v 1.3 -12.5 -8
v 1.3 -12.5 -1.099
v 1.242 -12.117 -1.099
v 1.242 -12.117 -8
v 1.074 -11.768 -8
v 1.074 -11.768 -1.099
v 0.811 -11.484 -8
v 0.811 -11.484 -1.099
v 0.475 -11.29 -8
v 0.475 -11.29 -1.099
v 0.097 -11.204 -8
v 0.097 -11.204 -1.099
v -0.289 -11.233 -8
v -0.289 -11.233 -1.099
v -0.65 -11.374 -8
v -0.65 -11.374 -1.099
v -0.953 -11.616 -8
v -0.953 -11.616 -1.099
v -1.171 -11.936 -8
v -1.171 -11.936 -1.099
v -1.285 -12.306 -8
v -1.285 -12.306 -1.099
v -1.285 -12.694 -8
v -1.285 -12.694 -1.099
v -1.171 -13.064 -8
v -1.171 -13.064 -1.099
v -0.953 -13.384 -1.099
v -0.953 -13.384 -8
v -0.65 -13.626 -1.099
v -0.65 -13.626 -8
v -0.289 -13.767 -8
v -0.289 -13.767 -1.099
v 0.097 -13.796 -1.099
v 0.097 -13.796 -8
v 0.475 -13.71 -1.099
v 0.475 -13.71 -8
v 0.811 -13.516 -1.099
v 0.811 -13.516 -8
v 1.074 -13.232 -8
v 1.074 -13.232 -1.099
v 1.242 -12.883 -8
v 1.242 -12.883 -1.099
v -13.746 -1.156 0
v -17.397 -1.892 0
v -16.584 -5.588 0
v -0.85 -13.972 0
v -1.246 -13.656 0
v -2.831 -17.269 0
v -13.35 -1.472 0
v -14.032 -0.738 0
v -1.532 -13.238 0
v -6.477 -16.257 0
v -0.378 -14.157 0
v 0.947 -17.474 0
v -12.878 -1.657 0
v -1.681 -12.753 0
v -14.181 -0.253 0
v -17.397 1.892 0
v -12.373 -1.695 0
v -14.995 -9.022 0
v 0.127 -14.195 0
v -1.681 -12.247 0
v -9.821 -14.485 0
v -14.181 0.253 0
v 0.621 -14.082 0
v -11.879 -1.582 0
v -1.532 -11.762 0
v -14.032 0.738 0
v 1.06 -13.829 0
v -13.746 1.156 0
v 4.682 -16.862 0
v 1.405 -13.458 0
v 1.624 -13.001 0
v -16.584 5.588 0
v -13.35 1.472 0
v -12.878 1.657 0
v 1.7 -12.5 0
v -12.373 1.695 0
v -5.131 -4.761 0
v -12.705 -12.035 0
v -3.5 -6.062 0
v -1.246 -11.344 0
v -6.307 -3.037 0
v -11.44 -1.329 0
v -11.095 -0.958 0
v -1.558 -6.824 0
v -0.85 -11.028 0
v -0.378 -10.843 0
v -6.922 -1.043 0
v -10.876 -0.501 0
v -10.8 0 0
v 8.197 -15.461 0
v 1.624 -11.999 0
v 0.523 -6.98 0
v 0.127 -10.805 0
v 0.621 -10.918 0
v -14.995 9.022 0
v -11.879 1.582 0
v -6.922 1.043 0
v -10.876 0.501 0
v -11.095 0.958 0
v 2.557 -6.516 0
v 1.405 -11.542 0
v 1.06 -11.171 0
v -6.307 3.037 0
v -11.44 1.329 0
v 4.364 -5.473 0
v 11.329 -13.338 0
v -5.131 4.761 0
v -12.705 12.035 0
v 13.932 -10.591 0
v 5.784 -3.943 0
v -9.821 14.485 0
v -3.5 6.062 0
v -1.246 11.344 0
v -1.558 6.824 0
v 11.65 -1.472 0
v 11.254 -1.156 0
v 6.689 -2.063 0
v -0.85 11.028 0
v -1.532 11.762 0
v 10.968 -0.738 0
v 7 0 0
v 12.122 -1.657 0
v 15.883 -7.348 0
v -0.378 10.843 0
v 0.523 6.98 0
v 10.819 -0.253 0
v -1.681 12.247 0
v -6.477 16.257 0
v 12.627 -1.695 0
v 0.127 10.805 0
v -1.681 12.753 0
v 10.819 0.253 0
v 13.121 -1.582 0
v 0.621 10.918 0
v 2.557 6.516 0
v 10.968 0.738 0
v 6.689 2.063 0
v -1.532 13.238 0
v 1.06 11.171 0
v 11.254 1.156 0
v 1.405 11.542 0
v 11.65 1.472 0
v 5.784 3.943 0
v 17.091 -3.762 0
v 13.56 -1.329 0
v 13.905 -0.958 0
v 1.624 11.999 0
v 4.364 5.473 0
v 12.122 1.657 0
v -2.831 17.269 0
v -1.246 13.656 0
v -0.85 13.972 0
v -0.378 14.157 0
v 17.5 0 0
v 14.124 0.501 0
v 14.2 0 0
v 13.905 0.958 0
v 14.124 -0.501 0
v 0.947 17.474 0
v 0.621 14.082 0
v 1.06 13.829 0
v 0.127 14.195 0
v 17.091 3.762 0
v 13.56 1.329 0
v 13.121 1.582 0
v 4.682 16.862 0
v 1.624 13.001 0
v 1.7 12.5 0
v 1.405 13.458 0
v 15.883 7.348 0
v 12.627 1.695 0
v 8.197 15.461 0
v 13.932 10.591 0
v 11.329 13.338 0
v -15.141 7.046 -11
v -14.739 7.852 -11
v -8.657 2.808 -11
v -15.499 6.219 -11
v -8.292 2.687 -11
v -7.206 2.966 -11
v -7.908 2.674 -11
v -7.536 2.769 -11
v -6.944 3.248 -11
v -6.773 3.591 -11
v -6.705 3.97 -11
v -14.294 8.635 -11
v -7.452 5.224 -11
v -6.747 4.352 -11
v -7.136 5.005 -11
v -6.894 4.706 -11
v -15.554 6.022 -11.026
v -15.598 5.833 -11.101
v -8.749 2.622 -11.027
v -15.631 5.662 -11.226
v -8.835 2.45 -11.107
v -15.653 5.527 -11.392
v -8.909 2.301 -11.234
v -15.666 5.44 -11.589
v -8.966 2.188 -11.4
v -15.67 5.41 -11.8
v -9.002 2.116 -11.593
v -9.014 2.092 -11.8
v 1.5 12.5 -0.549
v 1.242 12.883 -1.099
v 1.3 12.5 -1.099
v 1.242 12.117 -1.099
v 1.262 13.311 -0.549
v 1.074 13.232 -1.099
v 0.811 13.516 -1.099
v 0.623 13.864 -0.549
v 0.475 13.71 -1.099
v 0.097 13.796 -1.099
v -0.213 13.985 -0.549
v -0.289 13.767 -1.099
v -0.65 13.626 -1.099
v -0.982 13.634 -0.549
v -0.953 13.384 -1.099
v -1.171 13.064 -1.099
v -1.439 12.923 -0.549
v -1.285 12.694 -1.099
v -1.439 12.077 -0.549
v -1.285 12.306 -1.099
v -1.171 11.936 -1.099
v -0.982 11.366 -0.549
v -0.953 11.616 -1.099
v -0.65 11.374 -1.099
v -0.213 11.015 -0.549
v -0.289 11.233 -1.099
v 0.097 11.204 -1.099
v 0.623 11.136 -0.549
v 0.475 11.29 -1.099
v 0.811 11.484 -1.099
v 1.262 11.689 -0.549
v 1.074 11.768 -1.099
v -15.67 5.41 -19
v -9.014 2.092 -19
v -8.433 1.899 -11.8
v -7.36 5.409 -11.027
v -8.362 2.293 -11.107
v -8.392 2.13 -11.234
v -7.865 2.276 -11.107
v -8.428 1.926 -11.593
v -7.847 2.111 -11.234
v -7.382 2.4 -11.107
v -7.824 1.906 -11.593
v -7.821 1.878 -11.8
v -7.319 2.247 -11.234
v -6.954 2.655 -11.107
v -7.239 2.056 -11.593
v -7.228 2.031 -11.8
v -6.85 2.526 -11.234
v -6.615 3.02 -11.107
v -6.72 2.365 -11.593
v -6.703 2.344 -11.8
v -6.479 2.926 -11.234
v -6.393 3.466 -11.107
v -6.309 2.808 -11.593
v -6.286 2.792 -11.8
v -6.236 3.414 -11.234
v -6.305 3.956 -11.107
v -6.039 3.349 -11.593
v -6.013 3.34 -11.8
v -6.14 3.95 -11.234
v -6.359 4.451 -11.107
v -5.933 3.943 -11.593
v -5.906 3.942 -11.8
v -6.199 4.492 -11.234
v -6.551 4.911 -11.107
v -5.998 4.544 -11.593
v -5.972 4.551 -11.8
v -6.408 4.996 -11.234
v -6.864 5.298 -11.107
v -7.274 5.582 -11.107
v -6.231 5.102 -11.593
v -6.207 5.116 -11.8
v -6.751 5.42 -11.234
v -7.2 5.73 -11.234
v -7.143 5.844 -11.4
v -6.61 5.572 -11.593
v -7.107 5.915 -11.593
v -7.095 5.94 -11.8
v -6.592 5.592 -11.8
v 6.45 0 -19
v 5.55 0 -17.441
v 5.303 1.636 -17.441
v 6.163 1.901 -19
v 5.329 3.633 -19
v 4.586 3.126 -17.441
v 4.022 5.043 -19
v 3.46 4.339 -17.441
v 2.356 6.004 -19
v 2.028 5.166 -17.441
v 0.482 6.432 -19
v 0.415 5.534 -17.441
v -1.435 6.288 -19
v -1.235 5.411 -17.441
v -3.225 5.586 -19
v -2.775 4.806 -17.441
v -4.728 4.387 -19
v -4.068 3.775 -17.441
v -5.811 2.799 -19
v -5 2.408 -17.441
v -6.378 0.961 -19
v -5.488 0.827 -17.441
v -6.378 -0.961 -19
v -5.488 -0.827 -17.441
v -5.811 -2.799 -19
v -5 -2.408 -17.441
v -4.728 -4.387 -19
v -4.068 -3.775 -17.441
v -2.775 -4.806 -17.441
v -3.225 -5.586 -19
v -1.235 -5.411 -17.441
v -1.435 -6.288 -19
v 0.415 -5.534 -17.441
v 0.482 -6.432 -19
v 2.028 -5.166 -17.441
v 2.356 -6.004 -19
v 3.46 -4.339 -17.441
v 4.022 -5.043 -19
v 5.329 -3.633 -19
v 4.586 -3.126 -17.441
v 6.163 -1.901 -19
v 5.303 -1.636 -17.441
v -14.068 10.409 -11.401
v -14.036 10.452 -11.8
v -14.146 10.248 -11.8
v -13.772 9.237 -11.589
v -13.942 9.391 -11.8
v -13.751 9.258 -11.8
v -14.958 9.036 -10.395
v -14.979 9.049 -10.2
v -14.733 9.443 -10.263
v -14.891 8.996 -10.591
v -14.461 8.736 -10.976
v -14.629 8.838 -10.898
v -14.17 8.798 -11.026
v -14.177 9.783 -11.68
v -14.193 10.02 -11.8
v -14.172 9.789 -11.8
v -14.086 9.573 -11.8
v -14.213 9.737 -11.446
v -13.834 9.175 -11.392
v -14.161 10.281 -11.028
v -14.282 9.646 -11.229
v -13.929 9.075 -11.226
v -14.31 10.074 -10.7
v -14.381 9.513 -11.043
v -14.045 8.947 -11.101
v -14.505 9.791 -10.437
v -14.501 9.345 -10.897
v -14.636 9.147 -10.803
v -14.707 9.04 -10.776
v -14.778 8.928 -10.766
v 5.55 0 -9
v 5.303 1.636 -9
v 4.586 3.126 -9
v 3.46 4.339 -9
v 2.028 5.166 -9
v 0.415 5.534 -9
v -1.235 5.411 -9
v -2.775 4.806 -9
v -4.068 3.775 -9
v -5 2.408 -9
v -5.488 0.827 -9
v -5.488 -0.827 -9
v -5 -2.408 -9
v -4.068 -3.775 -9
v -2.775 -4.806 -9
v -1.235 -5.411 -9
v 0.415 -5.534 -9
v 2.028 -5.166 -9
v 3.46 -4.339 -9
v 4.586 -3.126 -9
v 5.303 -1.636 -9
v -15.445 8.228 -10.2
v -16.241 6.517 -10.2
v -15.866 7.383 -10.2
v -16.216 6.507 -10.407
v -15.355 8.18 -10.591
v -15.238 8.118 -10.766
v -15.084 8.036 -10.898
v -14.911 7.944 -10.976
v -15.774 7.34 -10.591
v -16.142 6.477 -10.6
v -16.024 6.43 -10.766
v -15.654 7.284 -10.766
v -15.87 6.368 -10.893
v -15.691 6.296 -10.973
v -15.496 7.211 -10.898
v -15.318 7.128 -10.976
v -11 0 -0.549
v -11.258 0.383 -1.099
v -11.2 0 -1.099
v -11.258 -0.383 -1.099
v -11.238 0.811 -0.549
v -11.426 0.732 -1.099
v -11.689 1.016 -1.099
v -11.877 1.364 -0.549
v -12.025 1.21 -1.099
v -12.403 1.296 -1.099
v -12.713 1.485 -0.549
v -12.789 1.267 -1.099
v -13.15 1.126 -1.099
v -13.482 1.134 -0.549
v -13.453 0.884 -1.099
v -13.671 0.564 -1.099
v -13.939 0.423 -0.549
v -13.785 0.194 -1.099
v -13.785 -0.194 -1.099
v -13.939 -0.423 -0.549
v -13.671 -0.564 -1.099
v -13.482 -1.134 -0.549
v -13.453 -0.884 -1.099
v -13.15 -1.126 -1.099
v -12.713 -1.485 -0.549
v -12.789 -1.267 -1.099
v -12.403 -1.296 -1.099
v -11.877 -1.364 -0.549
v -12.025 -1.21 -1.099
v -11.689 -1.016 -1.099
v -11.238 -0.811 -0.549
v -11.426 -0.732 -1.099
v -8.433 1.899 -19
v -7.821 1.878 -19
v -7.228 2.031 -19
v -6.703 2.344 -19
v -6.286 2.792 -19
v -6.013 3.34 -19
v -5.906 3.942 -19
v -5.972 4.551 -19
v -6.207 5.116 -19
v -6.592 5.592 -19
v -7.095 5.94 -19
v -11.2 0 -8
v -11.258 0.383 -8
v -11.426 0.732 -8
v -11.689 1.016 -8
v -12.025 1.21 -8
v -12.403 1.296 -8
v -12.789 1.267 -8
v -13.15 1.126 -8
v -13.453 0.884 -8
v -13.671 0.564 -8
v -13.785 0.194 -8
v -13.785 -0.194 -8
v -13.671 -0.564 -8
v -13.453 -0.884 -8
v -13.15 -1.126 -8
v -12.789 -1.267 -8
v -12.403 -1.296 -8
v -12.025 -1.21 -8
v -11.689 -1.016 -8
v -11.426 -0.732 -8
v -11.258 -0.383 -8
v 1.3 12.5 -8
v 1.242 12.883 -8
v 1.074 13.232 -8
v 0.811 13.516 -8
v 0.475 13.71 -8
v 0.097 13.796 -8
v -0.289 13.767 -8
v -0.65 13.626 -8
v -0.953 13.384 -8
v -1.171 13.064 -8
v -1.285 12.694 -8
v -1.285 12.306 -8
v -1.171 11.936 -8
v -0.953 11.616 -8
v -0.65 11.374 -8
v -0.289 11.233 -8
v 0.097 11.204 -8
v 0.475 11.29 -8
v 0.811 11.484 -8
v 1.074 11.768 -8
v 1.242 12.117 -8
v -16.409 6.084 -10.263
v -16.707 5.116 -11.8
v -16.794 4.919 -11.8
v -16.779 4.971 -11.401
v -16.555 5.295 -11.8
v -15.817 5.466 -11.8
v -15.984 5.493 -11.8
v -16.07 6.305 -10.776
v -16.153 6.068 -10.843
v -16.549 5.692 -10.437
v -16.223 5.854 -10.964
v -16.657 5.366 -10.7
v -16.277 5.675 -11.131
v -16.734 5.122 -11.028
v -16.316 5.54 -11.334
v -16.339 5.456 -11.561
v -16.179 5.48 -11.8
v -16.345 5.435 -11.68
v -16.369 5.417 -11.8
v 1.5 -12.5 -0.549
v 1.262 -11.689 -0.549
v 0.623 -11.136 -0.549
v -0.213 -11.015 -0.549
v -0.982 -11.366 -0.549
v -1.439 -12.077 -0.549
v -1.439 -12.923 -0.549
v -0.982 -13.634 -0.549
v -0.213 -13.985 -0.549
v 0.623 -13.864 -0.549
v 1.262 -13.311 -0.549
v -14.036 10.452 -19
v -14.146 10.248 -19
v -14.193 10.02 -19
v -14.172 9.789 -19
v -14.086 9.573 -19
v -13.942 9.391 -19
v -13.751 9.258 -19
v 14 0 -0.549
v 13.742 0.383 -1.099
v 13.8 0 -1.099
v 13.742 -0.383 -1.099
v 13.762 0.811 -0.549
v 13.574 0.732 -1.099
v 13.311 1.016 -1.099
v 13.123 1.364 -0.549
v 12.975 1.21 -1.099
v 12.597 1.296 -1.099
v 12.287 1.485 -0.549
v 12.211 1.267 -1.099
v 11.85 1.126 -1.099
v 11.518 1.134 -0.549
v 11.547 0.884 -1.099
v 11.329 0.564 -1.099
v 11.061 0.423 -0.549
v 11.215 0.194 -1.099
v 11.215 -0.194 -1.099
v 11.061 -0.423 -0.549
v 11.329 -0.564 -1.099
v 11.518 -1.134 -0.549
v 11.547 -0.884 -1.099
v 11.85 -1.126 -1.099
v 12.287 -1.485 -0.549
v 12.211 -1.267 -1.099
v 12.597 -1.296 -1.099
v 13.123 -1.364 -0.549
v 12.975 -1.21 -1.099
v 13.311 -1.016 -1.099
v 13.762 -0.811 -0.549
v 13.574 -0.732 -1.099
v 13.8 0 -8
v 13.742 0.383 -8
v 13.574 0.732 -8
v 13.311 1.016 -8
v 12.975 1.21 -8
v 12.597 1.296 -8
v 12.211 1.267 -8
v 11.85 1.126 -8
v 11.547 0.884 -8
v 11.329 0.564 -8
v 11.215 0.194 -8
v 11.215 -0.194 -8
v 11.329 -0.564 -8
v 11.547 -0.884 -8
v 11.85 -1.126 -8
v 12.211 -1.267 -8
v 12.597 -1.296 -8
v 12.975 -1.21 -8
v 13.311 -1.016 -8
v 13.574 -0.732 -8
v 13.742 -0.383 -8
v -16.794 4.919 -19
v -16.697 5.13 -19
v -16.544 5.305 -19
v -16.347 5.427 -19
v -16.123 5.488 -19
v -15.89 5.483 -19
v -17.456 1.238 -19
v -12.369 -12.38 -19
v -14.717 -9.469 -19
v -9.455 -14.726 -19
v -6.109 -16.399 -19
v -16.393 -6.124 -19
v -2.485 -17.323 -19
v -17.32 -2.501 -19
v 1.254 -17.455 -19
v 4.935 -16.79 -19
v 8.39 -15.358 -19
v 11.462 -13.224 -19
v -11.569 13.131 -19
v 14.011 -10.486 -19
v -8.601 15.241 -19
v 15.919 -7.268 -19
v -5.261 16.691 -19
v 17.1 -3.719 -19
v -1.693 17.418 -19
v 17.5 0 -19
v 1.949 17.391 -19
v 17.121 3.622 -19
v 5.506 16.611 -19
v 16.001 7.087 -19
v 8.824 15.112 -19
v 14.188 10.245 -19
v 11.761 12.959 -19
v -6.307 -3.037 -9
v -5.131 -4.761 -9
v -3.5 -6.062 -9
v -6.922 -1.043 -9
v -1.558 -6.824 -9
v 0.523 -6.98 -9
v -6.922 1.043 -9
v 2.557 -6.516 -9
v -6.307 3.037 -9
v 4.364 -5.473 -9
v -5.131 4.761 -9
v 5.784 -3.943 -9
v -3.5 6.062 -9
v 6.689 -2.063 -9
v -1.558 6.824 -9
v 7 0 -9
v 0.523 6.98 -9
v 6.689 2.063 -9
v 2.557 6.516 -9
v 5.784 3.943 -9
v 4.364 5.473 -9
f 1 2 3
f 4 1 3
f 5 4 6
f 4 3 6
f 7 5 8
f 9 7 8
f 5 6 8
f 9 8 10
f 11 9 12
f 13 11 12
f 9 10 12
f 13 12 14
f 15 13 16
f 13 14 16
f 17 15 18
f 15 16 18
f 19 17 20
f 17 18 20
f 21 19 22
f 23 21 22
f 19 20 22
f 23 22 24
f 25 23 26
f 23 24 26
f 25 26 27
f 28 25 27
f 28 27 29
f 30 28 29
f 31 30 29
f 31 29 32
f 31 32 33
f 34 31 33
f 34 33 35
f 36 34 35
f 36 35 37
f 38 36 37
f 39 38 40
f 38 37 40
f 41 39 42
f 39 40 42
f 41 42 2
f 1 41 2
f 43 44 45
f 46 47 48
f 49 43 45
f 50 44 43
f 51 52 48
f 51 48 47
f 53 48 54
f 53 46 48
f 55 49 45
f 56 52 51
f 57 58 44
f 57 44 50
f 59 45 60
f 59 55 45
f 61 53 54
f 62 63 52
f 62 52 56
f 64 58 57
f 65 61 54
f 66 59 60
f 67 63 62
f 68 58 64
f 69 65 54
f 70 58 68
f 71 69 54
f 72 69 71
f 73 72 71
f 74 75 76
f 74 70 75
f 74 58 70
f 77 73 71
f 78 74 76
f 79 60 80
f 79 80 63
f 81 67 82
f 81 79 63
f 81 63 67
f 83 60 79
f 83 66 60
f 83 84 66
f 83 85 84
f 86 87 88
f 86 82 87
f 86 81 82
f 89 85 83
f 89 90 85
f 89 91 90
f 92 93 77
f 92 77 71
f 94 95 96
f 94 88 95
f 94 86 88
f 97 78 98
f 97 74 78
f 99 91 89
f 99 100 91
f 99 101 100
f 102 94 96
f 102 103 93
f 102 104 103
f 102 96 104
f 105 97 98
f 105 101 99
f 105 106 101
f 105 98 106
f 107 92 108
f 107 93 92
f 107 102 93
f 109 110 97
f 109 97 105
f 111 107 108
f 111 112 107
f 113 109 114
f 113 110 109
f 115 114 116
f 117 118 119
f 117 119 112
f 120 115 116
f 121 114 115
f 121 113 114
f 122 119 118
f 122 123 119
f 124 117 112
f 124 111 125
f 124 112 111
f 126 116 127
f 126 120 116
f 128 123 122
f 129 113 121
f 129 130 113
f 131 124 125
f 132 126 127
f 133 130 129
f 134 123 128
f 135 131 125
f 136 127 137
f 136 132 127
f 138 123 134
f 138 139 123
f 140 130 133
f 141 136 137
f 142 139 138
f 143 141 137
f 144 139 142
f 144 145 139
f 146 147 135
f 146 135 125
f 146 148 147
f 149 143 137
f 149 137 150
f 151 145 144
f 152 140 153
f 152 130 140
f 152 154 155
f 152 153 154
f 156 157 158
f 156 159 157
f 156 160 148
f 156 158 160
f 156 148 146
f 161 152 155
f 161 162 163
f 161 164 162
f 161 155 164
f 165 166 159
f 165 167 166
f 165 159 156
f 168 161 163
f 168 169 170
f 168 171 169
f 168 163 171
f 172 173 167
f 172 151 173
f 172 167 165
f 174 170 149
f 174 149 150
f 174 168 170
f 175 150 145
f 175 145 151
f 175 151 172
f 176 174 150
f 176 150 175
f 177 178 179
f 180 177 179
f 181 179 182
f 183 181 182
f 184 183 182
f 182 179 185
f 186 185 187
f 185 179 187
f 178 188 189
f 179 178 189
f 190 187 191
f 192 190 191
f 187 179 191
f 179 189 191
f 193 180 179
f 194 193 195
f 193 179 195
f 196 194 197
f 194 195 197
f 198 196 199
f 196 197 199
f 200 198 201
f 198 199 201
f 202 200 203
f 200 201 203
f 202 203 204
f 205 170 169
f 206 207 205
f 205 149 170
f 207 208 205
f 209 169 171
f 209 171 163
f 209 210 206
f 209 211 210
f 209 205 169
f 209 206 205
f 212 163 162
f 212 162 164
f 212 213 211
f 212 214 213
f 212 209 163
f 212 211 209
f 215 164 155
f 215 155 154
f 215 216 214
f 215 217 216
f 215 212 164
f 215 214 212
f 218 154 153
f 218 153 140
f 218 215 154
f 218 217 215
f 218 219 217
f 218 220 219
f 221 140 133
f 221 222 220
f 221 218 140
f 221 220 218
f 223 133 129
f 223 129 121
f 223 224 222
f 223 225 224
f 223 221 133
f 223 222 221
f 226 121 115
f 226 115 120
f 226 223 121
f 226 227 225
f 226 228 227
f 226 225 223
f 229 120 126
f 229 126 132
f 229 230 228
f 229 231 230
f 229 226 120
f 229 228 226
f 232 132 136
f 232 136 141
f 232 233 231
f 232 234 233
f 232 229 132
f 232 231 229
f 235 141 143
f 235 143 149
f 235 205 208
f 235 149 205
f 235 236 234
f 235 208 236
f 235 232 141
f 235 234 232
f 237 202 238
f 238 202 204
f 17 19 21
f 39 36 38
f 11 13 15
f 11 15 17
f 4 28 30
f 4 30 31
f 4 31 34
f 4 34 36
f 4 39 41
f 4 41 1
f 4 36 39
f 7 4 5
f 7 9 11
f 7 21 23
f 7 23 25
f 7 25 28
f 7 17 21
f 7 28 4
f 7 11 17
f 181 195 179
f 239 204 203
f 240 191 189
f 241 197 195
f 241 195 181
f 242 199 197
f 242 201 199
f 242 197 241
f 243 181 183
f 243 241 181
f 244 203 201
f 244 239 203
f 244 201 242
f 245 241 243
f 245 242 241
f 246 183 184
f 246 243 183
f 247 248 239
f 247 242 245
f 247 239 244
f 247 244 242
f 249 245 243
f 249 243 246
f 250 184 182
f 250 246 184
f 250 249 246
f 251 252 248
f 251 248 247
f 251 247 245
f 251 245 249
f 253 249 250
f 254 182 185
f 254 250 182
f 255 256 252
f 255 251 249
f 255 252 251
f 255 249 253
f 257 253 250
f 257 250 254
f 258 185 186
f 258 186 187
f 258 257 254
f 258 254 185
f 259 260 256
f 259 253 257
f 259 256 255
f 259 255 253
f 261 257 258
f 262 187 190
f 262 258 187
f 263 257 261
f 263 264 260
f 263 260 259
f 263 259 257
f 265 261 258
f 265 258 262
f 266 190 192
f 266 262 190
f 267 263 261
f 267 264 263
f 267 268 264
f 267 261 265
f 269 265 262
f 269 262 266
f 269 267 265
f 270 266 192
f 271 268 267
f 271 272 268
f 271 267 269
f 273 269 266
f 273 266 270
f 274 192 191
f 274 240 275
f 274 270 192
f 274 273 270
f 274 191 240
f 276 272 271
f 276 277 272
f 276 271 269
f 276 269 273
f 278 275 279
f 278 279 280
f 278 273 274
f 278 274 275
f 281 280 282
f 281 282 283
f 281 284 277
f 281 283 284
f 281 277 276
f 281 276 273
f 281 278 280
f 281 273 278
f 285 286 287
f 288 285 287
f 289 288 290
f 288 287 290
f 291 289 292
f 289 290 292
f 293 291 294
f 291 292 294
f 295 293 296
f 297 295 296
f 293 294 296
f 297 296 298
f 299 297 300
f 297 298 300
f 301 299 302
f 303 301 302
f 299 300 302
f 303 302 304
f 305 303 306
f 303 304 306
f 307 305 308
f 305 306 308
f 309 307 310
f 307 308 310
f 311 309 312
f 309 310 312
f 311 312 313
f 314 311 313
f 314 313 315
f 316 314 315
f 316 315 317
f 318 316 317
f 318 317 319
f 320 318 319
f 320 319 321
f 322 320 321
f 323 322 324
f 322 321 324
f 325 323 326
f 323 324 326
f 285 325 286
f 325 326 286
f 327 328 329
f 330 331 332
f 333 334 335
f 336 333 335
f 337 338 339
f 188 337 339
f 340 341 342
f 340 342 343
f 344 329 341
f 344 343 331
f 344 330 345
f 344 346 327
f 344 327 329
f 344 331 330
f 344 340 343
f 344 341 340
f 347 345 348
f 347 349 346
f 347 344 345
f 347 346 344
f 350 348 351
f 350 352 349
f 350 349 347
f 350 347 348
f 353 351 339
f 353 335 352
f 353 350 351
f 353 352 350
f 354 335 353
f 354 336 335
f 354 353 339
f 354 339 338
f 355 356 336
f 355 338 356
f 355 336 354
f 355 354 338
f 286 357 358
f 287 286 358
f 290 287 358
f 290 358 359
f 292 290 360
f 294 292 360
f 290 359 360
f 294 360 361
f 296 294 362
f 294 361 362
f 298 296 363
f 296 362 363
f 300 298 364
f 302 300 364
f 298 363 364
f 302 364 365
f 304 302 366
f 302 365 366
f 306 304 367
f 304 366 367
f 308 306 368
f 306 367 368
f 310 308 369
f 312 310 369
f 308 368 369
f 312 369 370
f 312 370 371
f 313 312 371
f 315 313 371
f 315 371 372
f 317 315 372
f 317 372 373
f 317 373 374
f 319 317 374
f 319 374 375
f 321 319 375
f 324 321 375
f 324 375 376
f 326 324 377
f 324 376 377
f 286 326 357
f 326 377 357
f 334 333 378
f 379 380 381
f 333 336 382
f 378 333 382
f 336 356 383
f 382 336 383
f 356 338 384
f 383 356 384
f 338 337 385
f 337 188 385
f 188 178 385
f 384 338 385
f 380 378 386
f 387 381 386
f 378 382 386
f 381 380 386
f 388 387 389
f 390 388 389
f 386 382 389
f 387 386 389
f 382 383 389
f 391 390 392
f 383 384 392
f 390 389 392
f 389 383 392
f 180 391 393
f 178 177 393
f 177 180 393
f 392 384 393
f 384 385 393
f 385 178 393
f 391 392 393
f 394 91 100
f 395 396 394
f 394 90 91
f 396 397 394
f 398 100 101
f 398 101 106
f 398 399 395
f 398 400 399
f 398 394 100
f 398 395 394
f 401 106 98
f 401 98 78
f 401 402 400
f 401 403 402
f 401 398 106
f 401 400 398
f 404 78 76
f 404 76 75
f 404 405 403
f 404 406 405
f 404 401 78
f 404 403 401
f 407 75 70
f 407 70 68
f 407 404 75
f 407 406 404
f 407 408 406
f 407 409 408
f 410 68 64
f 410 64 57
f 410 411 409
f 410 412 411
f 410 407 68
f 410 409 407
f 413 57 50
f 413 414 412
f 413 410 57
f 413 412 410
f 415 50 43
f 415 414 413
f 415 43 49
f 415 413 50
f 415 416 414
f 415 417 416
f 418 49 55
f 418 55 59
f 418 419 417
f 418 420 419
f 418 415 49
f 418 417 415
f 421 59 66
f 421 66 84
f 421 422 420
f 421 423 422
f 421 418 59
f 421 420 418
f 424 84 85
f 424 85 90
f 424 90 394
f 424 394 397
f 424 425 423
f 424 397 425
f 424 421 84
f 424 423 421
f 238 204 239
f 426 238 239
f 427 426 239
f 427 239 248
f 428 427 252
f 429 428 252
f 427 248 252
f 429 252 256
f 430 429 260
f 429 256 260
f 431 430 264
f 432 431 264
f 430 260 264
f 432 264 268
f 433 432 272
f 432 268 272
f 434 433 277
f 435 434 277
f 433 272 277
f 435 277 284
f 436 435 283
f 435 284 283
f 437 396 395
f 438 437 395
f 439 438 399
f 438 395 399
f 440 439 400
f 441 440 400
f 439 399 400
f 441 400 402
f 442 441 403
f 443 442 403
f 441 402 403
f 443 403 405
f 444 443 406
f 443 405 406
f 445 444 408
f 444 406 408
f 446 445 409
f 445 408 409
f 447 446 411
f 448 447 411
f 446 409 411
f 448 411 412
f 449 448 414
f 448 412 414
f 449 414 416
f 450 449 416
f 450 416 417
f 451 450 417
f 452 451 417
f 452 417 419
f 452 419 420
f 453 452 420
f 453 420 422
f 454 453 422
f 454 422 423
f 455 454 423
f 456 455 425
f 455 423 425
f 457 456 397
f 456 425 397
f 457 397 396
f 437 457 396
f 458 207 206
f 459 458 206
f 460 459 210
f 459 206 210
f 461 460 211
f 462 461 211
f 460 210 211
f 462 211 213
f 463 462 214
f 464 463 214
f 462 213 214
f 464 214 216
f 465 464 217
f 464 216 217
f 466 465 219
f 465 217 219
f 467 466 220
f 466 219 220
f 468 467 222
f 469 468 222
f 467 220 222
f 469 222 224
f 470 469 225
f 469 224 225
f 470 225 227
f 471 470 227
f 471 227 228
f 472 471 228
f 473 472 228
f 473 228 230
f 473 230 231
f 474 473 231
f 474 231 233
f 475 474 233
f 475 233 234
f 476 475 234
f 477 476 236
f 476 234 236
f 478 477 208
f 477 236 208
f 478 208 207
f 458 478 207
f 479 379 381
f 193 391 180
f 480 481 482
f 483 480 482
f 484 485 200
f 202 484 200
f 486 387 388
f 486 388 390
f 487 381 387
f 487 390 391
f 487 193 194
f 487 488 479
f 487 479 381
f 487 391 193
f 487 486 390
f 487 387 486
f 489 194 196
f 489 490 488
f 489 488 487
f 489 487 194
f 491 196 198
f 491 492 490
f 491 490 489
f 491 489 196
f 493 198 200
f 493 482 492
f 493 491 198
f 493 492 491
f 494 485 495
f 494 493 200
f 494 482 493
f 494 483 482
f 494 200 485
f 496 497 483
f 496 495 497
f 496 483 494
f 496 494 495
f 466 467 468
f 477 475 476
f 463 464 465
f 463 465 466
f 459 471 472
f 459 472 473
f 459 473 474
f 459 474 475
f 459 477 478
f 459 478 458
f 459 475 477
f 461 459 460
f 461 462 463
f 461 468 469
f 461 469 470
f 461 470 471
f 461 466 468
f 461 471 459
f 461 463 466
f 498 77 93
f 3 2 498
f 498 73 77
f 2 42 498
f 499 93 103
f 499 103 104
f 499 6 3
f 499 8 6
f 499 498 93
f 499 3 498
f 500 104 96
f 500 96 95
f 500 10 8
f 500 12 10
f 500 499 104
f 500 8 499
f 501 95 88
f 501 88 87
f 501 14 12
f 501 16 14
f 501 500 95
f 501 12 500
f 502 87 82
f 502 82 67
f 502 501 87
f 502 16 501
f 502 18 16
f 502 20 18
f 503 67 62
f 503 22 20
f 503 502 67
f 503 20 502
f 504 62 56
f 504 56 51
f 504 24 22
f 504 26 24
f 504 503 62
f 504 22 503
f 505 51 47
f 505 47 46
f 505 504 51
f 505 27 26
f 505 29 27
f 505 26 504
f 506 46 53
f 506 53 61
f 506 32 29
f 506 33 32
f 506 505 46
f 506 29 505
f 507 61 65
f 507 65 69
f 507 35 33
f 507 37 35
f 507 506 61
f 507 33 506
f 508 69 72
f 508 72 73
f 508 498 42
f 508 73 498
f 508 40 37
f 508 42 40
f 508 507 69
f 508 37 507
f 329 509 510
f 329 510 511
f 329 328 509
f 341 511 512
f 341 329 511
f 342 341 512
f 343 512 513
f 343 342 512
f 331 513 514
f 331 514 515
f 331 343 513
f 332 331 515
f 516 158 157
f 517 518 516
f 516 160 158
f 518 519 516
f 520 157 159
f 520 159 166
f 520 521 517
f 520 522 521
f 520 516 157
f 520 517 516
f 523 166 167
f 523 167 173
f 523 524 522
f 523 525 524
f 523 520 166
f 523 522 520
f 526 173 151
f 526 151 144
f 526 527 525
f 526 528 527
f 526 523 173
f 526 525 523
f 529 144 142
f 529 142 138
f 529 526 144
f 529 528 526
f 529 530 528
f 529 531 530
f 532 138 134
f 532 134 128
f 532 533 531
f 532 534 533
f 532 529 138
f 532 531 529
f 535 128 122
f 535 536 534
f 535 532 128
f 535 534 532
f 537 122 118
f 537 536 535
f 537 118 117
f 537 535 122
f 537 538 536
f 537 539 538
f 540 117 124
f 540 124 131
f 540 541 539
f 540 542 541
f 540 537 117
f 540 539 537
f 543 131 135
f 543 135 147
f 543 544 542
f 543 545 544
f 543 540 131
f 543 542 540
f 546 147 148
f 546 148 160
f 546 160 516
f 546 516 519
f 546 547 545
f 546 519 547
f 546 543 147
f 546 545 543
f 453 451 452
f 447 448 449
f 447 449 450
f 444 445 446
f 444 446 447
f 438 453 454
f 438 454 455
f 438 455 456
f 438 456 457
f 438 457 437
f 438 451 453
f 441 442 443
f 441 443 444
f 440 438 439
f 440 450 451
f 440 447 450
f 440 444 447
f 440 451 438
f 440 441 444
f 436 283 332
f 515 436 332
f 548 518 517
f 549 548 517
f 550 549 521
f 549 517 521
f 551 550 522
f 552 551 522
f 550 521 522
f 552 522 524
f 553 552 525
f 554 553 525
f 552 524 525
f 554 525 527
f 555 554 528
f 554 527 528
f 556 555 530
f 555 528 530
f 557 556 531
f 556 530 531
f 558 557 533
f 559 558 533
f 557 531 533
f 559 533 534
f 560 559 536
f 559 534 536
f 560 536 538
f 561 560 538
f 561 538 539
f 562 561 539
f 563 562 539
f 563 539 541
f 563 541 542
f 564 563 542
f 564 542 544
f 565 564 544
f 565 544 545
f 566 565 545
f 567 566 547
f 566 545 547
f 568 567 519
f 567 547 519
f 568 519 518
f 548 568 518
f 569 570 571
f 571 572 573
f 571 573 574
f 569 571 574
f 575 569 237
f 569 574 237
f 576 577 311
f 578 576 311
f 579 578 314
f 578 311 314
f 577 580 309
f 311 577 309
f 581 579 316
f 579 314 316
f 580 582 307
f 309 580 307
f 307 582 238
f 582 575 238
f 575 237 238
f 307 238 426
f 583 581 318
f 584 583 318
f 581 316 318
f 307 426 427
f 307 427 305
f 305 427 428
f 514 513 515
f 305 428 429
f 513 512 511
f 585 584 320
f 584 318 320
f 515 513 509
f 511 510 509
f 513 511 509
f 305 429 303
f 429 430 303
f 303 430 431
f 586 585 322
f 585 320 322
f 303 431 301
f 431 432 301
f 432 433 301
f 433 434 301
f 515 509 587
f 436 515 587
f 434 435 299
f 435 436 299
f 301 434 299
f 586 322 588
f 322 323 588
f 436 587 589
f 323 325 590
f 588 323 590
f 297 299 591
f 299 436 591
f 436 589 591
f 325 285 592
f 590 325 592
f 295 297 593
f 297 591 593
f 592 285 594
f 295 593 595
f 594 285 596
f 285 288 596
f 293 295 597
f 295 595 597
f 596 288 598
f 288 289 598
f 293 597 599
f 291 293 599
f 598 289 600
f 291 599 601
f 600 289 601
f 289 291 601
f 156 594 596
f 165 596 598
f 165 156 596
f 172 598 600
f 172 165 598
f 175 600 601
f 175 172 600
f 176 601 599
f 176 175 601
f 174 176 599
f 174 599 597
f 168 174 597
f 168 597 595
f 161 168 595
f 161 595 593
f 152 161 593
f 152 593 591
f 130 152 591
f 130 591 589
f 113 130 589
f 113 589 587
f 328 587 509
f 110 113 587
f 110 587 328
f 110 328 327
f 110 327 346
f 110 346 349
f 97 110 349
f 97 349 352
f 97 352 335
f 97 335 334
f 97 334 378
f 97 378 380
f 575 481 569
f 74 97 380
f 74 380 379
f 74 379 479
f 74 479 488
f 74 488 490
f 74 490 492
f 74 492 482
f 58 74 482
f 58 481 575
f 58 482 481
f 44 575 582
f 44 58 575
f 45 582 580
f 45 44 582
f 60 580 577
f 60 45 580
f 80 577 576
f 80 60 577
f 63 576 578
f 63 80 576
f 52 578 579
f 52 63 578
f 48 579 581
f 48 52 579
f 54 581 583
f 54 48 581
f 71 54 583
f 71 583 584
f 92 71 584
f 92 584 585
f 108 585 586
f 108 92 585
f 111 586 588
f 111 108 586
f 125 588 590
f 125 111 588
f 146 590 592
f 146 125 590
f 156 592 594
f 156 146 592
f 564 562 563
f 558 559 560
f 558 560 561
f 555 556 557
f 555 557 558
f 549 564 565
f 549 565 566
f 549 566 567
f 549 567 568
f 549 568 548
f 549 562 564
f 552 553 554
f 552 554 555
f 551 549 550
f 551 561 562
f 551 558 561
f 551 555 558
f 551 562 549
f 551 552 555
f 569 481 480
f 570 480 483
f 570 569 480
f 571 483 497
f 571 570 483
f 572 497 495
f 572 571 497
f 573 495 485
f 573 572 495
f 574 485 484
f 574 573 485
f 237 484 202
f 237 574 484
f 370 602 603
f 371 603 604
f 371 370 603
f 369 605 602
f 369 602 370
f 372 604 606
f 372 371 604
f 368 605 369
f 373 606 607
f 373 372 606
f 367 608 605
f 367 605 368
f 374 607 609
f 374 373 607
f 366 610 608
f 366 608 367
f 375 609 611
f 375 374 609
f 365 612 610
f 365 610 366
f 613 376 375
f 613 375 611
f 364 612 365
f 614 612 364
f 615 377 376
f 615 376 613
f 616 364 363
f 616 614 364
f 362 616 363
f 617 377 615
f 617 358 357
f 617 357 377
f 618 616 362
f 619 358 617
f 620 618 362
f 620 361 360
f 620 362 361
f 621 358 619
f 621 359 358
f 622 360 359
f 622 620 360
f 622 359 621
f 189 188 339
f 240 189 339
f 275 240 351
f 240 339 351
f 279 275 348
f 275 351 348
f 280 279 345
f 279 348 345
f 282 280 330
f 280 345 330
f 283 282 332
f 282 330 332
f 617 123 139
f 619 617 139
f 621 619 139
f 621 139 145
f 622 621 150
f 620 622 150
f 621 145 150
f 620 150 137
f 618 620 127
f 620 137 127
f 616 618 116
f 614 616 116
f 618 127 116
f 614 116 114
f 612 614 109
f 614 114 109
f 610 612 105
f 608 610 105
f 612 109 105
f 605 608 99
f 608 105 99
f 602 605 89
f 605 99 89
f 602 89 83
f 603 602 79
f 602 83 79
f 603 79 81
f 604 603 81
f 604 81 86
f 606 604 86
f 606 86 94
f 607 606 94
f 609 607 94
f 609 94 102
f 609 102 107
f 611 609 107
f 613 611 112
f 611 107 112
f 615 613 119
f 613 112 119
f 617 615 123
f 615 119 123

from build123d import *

# Parameters (mm, degrees)
SKETCH_1_R          = 17.5
EXTRUDE_1_DEPTH     = 19
SKETCH_2_R          = 1.3
CUT_EXTRUDE_1_DEPTH = 8
SKETCH_4_R          = 7
CUT_EXTRUDE_3_DEPTH = 9
SKETCH_5_R          = 5.55
CUT_EXTRUDE_4_DEPTH = 10
CUT_EXTRUDE_START   = -8
CUT_EXTRUDE_6_DEPTH = 8
FILLET_2_R          = 0.8
CHAMFER_1_SIZE      = 0.9
CHAMFER_1_SIZE2     = 1.558845727
CHAMFER_2_SIZE      = 0.4
CHAMFER_2_SIZE2     = 1.098990968
FILLET_3_R          = 0.8


with BuildPart() as part:
    # 草图1 → 凸台-拉伸1 (new body)
    with BuildSketch(Plane.XY):
        Circle(SKETCH_1_R)
    extrude(amount=-EXTRUDE_1_DEPTH)

    # 草图2 → 切除-拉伸1 (cut)
    with BuildSketch(Plane.XY):
        with Locations((12.5, 0)):
            Circle(SKETCH_2_R)
        with Locations((0, -12.5)):
            Circle(SKETCH_2_R)
        with Locations((-12.5, 0)):
            Circle(SKETCH_2_R)
        with Locations((0, 12.5)):
            Circle(SKETCH_2_R)
    extrude(amount=-CUT_EXTRUDE_1_DEPTH, mode=Mode.SUBTRACT)

    # 草图4 → 切除-拉伸3 (cut)
    with BuildSketch(Plane.XY):
        Circle(SKETCH_4_R)
    extrude(amount=-CUT_EXTRUDE_3_DEPTH, mode=Mode.SUBTRACT)

    # 草图5 → 切除-拉伸4 (cut)
    with BuildSketch(Plane.XY.offset(-9)):
        Circle(SKETCH_5_R)
    extrude(amount=-CUT_EXTRUDE_4_DEPTH, mode=Mode.SUBTRACT)

    # 草图6 → 切除-拉伸6 (cut)
    with BuildSketch(Plane(origin=(0, 0, -19), x_dir=(-1, 0, 0), z_dir=(0, 0, -1)).offset(CUT_EXTRUDE_START)):
        with BuildLine():
            Line((7.095083956, 5.939889195), (14.583381366, 9.673416559))
            ThreePointArc((14.583381366, 9.673416559), (15.661351328, 7.808461729), (16.502031962, 5.825198805))
            Line((16.502031962, 5.825198805), (9.013734553, 2.091671441))
            ThreePointArc((9.013734553, 2.091671441), (6.130300377, 3.05645502), (7.095083956, 5.939889195))
        make_face()
    extrude(amount=CUT_EXTRUDE_6_DEPTH, mode=Mode.SUBTRACT)

    # 圆角2
    fillet_2_edges = [part.edges().sort_by_distance(p)[0] for p in [
        (-6.130300377, 3.05645502, -11),
        (-10.839232661, 7.806652877, -11),
        (-12.757883257, 3.958435123, -11),
    ]]
    fillet(fillet_2_edges, radius=FILLET_2_R)

    # 倒角1
    chamfer_1_edges = [part.edges().sort_by_distance(p)[0] for p in [
        (-5.55, 0, -19),
    ]]
    chamfer_1_side = [part.faces().sort_by_distance(p)[0] for p in [
        (-2.871452094, -16.760836695, -19),
    ]]
    chamfer(chamfer_1_edges, length=CHAMFER_1_SIZE, length2=CHAMFER_1_SIZE2, reference=chamfer_1_side[0])

    # 倒角2
    chamfer_2_edges = [part.edges().sort_by_distance(p)[0] for p in [
        (-1.3, -12.5, 0),
        (-13.8, 0, 0),
        (-1.3, 12.5, 0),
        (11.2, 0, 0),
    ]]
    chamfer_2_side = [part.faces().sort_by_distance(p)[0] for p in [
        (-17.005025253, 0, 0),
    ]]
    chamfer(chamfer_2_edges, length=CHAMFER_2_SIZE, length2=CHAMFER_2_SIZE2, reference=chamfer_2_side[0])

    # 圆角3
    fillet_3_edges = [part.edges().sort_by_distance(p)[0] for p in [
        (-15.661351328, 7.808461729, -11),
        (-16.502031962, 5.825198805, -15.4),
        (-14.583381366, 9.673416559, -15.4),
        (-16.421826211, 6.047613073, -11.233795824),
        (-14.712740273, 9.475509151, -11.233795824),
    ]]
    fillet(fillet_3_edges, radius=FILLET_3_R)


solid = part.part
